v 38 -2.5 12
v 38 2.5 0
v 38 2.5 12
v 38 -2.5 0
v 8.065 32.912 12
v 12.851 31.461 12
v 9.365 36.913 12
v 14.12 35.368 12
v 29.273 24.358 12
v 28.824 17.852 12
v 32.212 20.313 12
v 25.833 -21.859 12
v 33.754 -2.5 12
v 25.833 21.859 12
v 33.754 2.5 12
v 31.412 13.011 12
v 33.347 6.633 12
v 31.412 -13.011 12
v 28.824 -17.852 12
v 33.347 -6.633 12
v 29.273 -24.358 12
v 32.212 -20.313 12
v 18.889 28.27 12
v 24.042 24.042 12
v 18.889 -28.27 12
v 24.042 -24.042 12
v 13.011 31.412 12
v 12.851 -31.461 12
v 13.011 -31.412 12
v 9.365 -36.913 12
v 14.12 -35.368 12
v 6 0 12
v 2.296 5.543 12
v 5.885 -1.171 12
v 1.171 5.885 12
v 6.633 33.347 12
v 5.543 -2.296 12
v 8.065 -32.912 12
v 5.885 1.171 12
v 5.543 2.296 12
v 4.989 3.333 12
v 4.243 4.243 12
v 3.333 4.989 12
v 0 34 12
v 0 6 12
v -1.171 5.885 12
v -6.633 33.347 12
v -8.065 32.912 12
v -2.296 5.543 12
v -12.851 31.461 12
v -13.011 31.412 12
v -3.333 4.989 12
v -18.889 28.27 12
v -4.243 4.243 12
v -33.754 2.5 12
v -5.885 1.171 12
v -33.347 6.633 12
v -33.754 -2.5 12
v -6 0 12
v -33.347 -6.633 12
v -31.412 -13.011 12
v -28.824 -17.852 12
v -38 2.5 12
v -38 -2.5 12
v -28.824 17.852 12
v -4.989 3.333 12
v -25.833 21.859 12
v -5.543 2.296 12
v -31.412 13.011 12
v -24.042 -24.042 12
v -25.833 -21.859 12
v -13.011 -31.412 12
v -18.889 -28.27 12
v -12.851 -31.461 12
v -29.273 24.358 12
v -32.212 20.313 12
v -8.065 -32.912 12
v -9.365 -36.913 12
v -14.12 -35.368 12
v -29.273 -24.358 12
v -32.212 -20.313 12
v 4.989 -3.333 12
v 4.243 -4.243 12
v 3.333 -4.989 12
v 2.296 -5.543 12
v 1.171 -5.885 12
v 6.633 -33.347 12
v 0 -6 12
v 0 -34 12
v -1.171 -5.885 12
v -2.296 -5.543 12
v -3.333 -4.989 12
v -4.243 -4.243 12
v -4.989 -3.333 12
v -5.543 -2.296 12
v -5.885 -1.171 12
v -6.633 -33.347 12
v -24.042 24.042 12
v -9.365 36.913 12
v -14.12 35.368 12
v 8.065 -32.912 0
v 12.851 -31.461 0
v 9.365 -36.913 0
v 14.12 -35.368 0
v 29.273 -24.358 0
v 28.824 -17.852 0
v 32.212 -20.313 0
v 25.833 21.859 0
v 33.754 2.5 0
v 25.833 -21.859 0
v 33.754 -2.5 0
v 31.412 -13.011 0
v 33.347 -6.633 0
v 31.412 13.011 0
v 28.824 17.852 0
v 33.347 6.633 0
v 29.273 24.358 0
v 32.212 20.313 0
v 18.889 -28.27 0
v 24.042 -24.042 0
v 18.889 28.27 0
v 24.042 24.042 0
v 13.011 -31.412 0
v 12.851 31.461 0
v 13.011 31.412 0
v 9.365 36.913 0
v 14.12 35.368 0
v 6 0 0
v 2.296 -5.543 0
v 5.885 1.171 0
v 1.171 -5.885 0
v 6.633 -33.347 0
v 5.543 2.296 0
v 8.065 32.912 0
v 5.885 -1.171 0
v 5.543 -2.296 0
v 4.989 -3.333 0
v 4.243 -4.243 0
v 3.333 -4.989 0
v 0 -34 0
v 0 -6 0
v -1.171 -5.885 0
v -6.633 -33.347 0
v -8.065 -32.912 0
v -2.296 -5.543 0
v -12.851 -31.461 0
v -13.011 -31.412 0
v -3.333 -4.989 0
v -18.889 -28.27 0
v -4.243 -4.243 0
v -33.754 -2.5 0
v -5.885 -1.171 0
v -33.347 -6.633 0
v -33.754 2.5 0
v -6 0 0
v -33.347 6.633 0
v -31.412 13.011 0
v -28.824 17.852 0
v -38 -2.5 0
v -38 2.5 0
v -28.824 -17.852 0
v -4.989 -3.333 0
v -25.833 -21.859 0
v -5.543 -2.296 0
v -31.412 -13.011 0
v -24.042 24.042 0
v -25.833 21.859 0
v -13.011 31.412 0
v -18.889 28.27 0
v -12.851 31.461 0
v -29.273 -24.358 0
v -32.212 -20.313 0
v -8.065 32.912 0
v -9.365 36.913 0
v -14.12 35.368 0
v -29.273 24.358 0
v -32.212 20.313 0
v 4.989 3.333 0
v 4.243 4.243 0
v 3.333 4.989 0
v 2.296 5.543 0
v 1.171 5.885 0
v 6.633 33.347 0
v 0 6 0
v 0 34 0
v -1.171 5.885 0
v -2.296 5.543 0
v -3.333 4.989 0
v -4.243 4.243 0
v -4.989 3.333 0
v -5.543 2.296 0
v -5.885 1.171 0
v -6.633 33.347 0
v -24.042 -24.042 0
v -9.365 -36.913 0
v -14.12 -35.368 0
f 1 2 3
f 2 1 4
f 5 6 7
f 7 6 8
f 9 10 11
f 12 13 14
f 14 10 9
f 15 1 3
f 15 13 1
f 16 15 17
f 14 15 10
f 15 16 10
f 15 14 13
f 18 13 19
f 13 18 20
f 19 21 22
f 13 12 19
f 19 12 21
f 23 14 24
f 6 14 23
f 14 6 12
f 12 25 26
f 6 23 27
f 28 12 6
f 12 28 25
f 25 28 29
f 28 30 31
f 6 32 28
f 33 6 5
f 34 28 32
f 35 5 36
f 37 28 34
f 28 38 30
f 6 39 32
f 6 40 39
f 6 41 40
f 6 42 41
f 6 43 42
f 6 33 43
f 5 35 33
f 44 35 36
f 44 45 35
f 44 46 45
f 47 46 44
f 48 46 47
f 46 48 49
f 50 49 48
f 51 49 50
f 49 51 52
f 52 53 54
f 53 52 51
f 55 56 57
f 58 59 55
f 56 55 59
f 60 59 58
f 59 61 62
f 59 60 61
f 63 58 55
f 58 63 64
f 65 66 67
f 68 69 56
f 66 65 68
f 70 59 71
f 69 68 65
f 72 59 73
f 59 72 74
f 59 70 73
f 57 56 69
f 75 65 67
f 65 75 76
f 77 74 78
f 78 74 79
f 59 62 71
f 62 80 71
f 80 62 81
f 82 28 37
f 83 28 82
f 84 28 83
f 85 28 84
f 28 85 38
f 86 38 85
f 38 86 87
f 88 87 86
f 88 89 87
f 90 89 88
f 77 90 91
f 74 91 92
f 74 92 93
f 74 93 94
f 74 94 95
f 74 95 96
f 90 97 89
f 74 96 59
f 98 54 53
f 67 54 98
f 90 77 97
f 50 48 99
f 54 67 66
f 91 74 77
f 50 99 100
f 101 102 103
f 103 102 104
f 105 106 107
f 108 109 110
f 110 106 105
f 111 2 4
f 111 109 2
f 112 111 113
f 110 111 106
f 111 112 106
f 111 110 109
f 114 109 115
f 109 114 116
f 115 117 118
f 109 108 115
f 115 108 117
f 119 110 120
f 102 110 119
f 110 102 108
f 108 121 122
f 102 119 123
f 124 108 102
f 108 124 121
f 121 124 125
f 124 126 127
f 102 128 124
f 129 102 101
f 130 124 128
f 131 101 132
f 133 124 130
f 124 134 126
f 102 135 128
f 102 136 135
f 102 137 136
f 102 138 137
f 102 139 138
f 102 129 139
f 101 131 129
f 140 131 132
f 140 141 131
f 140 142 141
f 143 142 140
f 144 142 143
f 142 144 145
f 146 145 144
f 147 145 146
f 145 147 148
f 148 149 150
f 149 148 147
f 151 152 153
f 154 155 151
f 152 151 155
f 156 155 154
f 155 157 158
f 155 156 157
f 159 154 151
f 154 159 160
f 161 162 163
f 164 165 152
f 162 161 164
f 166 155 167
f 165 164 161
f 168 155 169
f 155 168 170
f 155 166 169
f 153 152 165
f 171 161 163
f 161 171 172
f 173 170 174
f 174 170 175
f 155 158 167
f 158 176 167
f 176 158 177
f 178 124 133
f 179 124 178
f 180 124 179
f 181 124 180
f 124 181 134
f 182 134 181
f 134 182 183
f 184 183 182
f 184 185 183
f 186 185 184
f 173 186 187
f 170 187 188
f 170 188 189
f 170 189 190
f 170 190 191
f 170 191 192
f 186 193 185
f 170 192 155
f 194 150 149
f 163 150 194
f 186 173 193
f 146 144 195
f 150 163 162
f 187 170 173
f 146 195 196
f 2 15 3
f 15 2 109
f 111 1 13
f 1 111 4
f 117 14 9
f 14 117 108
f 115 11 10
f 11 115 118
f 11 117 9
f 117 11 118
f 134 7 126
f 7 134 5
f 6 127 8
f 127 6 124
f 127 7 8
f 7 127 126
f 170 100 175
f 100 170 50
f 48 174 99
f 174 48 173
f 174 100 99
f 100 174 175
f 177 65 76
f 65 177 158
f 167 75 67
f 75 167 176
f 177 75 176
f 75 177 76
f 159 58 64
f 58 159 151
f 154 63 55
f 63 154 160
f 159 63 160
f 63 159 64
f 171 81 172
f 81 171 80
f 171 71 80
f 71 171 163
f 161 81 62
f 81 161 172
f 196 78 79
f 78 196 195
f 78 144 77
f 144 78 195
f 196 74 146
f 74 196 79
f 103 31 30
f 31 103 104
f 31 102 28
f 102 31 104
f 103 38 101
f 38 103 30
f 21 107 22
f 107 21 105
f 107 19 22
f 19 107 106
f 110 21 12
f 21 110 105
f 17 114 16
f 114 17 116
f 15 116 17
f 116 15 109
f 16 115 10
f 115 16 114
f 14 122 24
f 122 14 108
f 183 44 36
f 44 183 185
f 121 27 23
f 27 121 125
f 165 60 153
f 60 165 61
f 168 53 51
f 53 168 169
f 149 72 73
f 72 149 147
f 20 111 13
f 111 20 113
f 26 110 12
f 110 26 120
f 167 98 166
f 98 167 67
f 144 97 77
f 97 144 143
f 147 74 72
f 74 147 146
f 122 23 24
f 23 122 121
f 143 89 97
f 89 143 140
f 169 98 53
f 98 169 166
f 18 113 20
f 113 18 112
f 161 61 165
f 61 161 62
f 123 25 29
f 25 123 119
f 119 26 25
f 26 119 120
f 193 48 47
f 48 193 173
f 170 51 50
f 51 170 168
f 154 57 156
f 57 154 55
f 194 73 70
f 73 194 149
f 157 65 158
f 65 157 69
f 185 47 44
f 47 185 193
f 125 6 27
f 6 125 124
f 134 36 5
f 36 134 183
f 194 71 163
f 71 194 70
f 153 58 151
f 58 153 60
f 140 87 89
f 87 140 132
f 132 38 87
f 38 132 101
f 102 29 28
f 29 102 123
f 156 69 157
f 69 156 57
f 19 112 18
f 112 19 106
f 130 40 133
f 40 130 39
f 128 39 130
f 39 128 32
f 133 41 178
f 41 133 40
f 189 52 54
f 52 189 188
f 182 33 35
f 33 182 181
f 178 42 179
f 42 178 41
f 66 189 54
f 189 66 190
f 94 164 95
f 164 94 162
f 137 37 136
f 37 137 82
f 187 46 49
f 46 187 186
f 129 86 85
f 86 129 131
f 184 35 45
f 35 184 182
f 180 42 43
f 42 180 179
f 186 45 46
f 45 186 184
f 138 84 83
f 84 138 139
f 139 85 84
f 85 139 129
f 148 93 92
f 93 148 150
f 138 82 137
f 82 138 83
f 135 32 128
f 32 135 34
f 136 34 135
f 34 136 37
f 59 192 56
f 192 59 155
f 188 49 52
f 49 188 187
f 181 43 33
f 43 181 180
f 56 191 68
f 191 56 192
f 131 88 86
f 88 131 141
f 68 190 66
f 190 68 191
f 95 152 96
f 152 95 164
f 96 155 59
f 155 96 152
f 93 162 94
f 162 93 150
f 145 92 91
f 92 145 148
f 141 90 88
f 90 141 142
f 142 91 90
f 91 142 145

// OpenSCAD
$fn = 32;

// ----------------------------------------------------------------------
// Spur blank: bored gear blank
// ----------------------------------------------------------------------

// --- parameters (mm) ---
disc_r = 34;              // blank root radius
disc_t = 12;              // blank thickness
n_teeth = 10;             // stub tooth count
tooth_w = 5;              // tooth width at the root
tooth_h = 4;              // tooth height above the root
bore_r = 6;               // central bore radius
fit_tol = 0.1;            // tolerance for press fits, mm
free_tol = 0.3;           // tolerance for clearance fits, mm

out_r = disc_r + tooth_h;  // tip radius
bbox_x = 76.0;  // measured width over the teeth
bbox_y = 73.83;  // measured depth over the teeth

difference() {
union() {
  cylinder(r = disc_r, h = disc_t);
  for (i = [0 : n_teeth - 1])
    rotate([0, 0, i * 360 / n_teeth])
      translate([disc_r - 1, -tooth_w / 2, 0])
        cube([tooth_h + 1, tooth_w, disc_t]);
}
  translate([0, 0, -1]) cylinder(r = bore_r, h = disc_t + 2);
}
